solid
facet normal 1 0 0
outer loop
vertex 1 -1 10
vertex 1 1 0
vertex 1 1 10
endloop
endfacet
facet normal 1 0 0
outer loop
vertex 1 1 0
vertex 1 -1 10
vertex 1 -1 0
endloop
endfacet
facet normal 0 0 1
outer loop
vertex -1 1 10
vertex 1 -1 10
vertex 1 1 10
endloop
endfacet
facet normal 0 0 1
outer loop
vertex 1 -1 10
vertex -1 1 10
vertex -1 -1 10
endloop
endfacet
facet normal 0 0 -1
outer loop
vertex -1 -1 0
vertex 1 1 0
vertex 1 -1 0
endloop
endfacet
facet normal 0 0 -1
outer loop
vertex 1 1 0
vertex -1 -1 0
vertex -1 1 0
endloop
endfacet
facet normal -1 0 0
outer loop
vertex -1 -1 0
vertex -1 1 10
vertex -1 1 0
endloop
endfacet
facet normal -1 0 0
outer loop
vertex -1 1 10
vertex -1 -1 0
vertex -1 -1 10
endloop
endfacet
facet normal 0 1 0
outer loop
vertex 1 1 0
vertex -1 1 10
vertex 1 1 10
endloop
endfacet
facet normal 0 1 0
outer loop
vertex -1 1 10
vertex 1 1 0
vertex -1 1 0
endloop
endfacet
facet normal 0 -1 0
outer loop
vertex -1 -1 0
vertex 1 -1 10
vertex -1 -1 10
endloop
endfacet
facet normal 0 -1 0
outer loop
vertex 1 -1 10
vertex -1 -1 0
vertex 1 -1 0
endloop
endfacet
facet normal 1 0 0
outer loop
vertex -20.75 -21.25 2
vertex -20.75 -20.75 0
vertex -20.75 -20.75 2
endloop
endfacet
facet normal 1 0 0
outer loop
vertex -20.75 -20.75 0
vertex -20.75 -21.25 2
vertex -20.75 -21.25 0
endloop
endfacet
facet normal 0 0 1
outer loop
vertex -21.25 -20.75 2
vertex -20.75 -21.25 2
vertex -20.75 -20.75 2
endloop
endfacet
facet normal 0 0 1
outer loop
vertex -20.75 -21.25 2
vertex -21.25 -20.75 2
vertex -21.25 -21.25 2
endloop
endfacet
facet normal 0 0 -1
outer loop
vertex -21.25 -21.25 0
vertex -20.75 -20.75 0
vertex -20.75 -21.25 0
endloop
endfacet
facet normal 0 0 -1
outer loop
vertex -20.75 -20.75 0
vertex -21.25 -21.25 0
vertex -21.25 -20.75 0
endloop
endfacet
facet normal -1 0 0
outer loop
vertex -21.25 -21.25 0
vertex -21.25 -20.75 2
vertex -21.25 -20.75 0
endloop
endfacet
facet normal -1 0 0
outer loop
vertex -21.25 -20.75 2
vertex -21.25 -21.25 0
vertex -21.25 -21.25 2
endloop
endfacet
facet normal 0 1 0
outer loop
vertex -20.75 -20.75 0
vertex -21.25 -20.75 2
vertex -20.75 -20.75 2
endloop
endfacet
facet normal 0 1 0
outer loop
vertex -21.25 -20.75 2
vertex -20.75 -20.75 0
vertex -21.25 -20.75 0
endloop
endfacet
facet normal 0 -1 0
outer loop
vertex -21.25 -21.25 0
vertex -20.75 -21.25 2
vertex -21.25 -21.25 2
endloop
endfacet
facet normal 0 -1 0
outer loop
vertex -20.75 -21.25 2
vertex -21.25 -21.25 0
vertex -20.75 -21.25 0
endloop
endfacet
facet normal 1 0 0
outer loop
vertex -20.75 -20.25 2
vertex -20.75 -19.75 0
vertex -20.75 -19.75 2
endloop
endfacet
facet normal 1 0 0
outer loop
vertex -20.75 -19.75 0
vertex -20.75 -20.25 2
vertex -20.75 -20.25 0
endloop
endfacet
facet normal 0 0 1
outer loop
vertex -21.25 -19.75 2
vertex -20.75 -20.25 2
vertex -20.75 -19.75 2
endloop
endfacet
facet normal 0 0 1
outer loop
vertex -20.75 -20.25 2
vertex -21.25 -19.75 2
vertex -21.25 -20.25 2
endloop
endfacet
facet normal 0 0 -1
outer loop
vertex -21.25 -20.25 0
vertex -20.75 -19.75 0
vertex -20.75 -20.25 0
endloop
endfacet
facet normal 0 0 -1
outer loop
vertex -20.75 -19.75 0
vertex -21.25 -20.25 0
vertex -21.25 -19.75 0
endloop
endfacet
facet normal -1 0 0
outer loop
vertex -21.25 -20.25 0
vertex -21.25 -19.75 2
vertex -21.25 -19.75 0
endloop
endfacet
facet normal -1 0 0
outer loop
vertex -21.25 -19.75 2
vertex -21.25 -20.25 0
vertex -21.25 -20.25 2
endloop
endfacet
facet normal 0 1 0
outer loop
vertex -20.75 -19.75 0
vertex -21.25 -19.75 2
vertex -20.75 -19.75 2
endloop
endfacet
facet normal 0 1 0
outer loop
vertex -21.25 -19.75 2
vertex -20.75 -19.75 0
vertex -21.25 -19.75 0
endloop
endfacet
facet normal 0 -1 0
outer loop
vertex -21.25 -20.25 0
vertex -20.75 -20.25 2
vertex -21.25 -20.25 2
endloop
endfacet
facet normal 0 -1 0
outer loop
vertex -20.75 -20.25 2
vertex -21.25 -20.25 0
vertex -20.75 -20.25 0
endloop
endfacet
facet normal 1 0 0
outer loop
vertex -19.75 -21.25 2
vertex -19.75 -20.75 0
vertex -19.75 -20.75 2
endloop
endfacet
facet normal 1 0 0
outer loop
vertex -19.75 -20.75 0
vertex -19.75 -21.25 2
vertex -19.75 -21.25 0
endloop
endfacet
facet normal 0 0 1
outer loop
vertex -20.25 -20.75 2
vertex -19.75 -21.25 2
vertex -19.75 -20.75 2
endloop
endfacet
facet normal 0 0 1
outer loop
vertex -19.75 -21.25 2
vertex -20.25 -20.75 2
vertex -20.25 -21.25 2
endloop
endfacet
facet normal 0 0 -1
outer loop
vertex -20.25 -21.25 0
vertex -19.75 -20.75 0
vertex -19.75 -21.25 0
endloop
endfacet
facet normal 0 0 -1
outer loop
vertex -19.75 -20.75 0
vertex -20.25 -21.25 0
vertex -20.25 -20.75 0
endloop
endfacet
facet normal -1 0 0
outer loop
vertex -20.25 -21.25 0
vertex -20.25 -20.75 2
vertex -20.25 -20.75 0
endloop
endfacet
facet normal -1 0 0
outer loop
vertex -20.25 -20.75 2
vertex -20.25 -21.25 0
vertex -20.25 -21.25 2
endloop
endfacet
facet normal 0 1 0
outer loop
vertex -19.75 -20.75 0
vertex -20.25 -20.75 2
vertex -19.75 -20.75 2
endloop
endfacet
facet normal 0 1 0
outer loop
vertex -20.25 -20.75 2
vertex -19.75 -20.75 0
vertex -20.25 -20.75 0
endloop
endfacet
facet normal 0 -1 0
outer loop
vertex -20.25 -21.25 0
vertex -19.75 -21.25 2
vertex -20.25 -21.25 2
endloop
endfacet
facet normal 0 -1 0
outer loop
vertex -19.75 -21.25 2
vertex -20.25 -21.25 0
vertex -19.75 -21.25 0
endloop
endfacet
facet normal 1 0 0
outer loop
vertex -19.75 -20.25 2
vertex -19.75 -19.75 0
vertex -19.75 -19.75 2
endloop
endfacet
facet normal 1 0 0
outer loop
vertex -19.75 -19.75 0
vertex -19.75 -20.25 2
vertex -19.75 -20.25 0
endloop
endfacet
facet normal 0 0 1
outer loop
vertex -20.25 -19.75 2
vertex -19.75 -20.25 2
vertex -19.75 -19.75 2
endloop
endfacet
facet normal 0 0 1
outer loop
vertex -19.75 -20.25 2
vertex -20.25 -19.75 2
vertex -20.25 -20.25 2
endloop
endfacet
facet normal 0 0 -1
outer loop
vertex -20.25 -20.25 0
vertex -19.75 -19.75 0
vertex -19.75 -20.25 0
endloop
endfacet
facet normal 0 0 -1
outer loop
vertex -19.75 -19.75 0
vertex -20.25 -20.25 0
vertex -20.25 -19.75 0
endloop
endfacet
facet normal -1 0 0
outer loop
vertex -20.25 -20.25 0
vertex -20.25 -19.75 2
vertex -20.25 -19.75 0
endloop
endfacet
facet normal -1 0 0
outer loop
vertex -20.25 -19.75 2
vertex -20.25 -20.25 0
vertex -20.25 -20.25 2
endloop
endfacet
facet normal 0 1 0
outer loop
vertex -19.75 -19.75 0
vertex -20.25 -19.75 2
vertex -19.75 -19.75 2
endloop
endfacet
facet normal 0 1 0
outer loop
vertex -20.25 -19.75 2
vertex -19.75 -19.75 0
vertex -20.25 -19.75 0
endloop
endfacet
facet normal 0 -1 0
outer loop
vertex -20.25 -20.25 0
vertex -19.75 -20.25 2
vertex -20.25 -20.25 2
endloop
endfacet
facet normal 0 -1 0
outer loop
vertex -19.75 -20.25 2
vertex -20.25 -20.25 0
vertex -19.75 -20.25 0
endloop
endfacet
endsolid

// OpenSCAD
translate([0, 0, 5]) color([0,1,0,0.9]) cube([2, 2, 10], center=true);
translate([-21.0, -21.0, 1]) color([1,0,0]) cube([0.5, 0.5, 2], center=true);
translate([-21.0, -20.0, 1]) color([1,0,0]) cube([0.5, 0.5, 2], center=true);
translate([-20.0, -21.0, 1]) color([1,0,0]) cube([0.5, 0.5, 2], center=true);
translate([-20.0, -20.0, 1]) color([1,0,0]) cube([0.5, 0.5, 2], center=true);
